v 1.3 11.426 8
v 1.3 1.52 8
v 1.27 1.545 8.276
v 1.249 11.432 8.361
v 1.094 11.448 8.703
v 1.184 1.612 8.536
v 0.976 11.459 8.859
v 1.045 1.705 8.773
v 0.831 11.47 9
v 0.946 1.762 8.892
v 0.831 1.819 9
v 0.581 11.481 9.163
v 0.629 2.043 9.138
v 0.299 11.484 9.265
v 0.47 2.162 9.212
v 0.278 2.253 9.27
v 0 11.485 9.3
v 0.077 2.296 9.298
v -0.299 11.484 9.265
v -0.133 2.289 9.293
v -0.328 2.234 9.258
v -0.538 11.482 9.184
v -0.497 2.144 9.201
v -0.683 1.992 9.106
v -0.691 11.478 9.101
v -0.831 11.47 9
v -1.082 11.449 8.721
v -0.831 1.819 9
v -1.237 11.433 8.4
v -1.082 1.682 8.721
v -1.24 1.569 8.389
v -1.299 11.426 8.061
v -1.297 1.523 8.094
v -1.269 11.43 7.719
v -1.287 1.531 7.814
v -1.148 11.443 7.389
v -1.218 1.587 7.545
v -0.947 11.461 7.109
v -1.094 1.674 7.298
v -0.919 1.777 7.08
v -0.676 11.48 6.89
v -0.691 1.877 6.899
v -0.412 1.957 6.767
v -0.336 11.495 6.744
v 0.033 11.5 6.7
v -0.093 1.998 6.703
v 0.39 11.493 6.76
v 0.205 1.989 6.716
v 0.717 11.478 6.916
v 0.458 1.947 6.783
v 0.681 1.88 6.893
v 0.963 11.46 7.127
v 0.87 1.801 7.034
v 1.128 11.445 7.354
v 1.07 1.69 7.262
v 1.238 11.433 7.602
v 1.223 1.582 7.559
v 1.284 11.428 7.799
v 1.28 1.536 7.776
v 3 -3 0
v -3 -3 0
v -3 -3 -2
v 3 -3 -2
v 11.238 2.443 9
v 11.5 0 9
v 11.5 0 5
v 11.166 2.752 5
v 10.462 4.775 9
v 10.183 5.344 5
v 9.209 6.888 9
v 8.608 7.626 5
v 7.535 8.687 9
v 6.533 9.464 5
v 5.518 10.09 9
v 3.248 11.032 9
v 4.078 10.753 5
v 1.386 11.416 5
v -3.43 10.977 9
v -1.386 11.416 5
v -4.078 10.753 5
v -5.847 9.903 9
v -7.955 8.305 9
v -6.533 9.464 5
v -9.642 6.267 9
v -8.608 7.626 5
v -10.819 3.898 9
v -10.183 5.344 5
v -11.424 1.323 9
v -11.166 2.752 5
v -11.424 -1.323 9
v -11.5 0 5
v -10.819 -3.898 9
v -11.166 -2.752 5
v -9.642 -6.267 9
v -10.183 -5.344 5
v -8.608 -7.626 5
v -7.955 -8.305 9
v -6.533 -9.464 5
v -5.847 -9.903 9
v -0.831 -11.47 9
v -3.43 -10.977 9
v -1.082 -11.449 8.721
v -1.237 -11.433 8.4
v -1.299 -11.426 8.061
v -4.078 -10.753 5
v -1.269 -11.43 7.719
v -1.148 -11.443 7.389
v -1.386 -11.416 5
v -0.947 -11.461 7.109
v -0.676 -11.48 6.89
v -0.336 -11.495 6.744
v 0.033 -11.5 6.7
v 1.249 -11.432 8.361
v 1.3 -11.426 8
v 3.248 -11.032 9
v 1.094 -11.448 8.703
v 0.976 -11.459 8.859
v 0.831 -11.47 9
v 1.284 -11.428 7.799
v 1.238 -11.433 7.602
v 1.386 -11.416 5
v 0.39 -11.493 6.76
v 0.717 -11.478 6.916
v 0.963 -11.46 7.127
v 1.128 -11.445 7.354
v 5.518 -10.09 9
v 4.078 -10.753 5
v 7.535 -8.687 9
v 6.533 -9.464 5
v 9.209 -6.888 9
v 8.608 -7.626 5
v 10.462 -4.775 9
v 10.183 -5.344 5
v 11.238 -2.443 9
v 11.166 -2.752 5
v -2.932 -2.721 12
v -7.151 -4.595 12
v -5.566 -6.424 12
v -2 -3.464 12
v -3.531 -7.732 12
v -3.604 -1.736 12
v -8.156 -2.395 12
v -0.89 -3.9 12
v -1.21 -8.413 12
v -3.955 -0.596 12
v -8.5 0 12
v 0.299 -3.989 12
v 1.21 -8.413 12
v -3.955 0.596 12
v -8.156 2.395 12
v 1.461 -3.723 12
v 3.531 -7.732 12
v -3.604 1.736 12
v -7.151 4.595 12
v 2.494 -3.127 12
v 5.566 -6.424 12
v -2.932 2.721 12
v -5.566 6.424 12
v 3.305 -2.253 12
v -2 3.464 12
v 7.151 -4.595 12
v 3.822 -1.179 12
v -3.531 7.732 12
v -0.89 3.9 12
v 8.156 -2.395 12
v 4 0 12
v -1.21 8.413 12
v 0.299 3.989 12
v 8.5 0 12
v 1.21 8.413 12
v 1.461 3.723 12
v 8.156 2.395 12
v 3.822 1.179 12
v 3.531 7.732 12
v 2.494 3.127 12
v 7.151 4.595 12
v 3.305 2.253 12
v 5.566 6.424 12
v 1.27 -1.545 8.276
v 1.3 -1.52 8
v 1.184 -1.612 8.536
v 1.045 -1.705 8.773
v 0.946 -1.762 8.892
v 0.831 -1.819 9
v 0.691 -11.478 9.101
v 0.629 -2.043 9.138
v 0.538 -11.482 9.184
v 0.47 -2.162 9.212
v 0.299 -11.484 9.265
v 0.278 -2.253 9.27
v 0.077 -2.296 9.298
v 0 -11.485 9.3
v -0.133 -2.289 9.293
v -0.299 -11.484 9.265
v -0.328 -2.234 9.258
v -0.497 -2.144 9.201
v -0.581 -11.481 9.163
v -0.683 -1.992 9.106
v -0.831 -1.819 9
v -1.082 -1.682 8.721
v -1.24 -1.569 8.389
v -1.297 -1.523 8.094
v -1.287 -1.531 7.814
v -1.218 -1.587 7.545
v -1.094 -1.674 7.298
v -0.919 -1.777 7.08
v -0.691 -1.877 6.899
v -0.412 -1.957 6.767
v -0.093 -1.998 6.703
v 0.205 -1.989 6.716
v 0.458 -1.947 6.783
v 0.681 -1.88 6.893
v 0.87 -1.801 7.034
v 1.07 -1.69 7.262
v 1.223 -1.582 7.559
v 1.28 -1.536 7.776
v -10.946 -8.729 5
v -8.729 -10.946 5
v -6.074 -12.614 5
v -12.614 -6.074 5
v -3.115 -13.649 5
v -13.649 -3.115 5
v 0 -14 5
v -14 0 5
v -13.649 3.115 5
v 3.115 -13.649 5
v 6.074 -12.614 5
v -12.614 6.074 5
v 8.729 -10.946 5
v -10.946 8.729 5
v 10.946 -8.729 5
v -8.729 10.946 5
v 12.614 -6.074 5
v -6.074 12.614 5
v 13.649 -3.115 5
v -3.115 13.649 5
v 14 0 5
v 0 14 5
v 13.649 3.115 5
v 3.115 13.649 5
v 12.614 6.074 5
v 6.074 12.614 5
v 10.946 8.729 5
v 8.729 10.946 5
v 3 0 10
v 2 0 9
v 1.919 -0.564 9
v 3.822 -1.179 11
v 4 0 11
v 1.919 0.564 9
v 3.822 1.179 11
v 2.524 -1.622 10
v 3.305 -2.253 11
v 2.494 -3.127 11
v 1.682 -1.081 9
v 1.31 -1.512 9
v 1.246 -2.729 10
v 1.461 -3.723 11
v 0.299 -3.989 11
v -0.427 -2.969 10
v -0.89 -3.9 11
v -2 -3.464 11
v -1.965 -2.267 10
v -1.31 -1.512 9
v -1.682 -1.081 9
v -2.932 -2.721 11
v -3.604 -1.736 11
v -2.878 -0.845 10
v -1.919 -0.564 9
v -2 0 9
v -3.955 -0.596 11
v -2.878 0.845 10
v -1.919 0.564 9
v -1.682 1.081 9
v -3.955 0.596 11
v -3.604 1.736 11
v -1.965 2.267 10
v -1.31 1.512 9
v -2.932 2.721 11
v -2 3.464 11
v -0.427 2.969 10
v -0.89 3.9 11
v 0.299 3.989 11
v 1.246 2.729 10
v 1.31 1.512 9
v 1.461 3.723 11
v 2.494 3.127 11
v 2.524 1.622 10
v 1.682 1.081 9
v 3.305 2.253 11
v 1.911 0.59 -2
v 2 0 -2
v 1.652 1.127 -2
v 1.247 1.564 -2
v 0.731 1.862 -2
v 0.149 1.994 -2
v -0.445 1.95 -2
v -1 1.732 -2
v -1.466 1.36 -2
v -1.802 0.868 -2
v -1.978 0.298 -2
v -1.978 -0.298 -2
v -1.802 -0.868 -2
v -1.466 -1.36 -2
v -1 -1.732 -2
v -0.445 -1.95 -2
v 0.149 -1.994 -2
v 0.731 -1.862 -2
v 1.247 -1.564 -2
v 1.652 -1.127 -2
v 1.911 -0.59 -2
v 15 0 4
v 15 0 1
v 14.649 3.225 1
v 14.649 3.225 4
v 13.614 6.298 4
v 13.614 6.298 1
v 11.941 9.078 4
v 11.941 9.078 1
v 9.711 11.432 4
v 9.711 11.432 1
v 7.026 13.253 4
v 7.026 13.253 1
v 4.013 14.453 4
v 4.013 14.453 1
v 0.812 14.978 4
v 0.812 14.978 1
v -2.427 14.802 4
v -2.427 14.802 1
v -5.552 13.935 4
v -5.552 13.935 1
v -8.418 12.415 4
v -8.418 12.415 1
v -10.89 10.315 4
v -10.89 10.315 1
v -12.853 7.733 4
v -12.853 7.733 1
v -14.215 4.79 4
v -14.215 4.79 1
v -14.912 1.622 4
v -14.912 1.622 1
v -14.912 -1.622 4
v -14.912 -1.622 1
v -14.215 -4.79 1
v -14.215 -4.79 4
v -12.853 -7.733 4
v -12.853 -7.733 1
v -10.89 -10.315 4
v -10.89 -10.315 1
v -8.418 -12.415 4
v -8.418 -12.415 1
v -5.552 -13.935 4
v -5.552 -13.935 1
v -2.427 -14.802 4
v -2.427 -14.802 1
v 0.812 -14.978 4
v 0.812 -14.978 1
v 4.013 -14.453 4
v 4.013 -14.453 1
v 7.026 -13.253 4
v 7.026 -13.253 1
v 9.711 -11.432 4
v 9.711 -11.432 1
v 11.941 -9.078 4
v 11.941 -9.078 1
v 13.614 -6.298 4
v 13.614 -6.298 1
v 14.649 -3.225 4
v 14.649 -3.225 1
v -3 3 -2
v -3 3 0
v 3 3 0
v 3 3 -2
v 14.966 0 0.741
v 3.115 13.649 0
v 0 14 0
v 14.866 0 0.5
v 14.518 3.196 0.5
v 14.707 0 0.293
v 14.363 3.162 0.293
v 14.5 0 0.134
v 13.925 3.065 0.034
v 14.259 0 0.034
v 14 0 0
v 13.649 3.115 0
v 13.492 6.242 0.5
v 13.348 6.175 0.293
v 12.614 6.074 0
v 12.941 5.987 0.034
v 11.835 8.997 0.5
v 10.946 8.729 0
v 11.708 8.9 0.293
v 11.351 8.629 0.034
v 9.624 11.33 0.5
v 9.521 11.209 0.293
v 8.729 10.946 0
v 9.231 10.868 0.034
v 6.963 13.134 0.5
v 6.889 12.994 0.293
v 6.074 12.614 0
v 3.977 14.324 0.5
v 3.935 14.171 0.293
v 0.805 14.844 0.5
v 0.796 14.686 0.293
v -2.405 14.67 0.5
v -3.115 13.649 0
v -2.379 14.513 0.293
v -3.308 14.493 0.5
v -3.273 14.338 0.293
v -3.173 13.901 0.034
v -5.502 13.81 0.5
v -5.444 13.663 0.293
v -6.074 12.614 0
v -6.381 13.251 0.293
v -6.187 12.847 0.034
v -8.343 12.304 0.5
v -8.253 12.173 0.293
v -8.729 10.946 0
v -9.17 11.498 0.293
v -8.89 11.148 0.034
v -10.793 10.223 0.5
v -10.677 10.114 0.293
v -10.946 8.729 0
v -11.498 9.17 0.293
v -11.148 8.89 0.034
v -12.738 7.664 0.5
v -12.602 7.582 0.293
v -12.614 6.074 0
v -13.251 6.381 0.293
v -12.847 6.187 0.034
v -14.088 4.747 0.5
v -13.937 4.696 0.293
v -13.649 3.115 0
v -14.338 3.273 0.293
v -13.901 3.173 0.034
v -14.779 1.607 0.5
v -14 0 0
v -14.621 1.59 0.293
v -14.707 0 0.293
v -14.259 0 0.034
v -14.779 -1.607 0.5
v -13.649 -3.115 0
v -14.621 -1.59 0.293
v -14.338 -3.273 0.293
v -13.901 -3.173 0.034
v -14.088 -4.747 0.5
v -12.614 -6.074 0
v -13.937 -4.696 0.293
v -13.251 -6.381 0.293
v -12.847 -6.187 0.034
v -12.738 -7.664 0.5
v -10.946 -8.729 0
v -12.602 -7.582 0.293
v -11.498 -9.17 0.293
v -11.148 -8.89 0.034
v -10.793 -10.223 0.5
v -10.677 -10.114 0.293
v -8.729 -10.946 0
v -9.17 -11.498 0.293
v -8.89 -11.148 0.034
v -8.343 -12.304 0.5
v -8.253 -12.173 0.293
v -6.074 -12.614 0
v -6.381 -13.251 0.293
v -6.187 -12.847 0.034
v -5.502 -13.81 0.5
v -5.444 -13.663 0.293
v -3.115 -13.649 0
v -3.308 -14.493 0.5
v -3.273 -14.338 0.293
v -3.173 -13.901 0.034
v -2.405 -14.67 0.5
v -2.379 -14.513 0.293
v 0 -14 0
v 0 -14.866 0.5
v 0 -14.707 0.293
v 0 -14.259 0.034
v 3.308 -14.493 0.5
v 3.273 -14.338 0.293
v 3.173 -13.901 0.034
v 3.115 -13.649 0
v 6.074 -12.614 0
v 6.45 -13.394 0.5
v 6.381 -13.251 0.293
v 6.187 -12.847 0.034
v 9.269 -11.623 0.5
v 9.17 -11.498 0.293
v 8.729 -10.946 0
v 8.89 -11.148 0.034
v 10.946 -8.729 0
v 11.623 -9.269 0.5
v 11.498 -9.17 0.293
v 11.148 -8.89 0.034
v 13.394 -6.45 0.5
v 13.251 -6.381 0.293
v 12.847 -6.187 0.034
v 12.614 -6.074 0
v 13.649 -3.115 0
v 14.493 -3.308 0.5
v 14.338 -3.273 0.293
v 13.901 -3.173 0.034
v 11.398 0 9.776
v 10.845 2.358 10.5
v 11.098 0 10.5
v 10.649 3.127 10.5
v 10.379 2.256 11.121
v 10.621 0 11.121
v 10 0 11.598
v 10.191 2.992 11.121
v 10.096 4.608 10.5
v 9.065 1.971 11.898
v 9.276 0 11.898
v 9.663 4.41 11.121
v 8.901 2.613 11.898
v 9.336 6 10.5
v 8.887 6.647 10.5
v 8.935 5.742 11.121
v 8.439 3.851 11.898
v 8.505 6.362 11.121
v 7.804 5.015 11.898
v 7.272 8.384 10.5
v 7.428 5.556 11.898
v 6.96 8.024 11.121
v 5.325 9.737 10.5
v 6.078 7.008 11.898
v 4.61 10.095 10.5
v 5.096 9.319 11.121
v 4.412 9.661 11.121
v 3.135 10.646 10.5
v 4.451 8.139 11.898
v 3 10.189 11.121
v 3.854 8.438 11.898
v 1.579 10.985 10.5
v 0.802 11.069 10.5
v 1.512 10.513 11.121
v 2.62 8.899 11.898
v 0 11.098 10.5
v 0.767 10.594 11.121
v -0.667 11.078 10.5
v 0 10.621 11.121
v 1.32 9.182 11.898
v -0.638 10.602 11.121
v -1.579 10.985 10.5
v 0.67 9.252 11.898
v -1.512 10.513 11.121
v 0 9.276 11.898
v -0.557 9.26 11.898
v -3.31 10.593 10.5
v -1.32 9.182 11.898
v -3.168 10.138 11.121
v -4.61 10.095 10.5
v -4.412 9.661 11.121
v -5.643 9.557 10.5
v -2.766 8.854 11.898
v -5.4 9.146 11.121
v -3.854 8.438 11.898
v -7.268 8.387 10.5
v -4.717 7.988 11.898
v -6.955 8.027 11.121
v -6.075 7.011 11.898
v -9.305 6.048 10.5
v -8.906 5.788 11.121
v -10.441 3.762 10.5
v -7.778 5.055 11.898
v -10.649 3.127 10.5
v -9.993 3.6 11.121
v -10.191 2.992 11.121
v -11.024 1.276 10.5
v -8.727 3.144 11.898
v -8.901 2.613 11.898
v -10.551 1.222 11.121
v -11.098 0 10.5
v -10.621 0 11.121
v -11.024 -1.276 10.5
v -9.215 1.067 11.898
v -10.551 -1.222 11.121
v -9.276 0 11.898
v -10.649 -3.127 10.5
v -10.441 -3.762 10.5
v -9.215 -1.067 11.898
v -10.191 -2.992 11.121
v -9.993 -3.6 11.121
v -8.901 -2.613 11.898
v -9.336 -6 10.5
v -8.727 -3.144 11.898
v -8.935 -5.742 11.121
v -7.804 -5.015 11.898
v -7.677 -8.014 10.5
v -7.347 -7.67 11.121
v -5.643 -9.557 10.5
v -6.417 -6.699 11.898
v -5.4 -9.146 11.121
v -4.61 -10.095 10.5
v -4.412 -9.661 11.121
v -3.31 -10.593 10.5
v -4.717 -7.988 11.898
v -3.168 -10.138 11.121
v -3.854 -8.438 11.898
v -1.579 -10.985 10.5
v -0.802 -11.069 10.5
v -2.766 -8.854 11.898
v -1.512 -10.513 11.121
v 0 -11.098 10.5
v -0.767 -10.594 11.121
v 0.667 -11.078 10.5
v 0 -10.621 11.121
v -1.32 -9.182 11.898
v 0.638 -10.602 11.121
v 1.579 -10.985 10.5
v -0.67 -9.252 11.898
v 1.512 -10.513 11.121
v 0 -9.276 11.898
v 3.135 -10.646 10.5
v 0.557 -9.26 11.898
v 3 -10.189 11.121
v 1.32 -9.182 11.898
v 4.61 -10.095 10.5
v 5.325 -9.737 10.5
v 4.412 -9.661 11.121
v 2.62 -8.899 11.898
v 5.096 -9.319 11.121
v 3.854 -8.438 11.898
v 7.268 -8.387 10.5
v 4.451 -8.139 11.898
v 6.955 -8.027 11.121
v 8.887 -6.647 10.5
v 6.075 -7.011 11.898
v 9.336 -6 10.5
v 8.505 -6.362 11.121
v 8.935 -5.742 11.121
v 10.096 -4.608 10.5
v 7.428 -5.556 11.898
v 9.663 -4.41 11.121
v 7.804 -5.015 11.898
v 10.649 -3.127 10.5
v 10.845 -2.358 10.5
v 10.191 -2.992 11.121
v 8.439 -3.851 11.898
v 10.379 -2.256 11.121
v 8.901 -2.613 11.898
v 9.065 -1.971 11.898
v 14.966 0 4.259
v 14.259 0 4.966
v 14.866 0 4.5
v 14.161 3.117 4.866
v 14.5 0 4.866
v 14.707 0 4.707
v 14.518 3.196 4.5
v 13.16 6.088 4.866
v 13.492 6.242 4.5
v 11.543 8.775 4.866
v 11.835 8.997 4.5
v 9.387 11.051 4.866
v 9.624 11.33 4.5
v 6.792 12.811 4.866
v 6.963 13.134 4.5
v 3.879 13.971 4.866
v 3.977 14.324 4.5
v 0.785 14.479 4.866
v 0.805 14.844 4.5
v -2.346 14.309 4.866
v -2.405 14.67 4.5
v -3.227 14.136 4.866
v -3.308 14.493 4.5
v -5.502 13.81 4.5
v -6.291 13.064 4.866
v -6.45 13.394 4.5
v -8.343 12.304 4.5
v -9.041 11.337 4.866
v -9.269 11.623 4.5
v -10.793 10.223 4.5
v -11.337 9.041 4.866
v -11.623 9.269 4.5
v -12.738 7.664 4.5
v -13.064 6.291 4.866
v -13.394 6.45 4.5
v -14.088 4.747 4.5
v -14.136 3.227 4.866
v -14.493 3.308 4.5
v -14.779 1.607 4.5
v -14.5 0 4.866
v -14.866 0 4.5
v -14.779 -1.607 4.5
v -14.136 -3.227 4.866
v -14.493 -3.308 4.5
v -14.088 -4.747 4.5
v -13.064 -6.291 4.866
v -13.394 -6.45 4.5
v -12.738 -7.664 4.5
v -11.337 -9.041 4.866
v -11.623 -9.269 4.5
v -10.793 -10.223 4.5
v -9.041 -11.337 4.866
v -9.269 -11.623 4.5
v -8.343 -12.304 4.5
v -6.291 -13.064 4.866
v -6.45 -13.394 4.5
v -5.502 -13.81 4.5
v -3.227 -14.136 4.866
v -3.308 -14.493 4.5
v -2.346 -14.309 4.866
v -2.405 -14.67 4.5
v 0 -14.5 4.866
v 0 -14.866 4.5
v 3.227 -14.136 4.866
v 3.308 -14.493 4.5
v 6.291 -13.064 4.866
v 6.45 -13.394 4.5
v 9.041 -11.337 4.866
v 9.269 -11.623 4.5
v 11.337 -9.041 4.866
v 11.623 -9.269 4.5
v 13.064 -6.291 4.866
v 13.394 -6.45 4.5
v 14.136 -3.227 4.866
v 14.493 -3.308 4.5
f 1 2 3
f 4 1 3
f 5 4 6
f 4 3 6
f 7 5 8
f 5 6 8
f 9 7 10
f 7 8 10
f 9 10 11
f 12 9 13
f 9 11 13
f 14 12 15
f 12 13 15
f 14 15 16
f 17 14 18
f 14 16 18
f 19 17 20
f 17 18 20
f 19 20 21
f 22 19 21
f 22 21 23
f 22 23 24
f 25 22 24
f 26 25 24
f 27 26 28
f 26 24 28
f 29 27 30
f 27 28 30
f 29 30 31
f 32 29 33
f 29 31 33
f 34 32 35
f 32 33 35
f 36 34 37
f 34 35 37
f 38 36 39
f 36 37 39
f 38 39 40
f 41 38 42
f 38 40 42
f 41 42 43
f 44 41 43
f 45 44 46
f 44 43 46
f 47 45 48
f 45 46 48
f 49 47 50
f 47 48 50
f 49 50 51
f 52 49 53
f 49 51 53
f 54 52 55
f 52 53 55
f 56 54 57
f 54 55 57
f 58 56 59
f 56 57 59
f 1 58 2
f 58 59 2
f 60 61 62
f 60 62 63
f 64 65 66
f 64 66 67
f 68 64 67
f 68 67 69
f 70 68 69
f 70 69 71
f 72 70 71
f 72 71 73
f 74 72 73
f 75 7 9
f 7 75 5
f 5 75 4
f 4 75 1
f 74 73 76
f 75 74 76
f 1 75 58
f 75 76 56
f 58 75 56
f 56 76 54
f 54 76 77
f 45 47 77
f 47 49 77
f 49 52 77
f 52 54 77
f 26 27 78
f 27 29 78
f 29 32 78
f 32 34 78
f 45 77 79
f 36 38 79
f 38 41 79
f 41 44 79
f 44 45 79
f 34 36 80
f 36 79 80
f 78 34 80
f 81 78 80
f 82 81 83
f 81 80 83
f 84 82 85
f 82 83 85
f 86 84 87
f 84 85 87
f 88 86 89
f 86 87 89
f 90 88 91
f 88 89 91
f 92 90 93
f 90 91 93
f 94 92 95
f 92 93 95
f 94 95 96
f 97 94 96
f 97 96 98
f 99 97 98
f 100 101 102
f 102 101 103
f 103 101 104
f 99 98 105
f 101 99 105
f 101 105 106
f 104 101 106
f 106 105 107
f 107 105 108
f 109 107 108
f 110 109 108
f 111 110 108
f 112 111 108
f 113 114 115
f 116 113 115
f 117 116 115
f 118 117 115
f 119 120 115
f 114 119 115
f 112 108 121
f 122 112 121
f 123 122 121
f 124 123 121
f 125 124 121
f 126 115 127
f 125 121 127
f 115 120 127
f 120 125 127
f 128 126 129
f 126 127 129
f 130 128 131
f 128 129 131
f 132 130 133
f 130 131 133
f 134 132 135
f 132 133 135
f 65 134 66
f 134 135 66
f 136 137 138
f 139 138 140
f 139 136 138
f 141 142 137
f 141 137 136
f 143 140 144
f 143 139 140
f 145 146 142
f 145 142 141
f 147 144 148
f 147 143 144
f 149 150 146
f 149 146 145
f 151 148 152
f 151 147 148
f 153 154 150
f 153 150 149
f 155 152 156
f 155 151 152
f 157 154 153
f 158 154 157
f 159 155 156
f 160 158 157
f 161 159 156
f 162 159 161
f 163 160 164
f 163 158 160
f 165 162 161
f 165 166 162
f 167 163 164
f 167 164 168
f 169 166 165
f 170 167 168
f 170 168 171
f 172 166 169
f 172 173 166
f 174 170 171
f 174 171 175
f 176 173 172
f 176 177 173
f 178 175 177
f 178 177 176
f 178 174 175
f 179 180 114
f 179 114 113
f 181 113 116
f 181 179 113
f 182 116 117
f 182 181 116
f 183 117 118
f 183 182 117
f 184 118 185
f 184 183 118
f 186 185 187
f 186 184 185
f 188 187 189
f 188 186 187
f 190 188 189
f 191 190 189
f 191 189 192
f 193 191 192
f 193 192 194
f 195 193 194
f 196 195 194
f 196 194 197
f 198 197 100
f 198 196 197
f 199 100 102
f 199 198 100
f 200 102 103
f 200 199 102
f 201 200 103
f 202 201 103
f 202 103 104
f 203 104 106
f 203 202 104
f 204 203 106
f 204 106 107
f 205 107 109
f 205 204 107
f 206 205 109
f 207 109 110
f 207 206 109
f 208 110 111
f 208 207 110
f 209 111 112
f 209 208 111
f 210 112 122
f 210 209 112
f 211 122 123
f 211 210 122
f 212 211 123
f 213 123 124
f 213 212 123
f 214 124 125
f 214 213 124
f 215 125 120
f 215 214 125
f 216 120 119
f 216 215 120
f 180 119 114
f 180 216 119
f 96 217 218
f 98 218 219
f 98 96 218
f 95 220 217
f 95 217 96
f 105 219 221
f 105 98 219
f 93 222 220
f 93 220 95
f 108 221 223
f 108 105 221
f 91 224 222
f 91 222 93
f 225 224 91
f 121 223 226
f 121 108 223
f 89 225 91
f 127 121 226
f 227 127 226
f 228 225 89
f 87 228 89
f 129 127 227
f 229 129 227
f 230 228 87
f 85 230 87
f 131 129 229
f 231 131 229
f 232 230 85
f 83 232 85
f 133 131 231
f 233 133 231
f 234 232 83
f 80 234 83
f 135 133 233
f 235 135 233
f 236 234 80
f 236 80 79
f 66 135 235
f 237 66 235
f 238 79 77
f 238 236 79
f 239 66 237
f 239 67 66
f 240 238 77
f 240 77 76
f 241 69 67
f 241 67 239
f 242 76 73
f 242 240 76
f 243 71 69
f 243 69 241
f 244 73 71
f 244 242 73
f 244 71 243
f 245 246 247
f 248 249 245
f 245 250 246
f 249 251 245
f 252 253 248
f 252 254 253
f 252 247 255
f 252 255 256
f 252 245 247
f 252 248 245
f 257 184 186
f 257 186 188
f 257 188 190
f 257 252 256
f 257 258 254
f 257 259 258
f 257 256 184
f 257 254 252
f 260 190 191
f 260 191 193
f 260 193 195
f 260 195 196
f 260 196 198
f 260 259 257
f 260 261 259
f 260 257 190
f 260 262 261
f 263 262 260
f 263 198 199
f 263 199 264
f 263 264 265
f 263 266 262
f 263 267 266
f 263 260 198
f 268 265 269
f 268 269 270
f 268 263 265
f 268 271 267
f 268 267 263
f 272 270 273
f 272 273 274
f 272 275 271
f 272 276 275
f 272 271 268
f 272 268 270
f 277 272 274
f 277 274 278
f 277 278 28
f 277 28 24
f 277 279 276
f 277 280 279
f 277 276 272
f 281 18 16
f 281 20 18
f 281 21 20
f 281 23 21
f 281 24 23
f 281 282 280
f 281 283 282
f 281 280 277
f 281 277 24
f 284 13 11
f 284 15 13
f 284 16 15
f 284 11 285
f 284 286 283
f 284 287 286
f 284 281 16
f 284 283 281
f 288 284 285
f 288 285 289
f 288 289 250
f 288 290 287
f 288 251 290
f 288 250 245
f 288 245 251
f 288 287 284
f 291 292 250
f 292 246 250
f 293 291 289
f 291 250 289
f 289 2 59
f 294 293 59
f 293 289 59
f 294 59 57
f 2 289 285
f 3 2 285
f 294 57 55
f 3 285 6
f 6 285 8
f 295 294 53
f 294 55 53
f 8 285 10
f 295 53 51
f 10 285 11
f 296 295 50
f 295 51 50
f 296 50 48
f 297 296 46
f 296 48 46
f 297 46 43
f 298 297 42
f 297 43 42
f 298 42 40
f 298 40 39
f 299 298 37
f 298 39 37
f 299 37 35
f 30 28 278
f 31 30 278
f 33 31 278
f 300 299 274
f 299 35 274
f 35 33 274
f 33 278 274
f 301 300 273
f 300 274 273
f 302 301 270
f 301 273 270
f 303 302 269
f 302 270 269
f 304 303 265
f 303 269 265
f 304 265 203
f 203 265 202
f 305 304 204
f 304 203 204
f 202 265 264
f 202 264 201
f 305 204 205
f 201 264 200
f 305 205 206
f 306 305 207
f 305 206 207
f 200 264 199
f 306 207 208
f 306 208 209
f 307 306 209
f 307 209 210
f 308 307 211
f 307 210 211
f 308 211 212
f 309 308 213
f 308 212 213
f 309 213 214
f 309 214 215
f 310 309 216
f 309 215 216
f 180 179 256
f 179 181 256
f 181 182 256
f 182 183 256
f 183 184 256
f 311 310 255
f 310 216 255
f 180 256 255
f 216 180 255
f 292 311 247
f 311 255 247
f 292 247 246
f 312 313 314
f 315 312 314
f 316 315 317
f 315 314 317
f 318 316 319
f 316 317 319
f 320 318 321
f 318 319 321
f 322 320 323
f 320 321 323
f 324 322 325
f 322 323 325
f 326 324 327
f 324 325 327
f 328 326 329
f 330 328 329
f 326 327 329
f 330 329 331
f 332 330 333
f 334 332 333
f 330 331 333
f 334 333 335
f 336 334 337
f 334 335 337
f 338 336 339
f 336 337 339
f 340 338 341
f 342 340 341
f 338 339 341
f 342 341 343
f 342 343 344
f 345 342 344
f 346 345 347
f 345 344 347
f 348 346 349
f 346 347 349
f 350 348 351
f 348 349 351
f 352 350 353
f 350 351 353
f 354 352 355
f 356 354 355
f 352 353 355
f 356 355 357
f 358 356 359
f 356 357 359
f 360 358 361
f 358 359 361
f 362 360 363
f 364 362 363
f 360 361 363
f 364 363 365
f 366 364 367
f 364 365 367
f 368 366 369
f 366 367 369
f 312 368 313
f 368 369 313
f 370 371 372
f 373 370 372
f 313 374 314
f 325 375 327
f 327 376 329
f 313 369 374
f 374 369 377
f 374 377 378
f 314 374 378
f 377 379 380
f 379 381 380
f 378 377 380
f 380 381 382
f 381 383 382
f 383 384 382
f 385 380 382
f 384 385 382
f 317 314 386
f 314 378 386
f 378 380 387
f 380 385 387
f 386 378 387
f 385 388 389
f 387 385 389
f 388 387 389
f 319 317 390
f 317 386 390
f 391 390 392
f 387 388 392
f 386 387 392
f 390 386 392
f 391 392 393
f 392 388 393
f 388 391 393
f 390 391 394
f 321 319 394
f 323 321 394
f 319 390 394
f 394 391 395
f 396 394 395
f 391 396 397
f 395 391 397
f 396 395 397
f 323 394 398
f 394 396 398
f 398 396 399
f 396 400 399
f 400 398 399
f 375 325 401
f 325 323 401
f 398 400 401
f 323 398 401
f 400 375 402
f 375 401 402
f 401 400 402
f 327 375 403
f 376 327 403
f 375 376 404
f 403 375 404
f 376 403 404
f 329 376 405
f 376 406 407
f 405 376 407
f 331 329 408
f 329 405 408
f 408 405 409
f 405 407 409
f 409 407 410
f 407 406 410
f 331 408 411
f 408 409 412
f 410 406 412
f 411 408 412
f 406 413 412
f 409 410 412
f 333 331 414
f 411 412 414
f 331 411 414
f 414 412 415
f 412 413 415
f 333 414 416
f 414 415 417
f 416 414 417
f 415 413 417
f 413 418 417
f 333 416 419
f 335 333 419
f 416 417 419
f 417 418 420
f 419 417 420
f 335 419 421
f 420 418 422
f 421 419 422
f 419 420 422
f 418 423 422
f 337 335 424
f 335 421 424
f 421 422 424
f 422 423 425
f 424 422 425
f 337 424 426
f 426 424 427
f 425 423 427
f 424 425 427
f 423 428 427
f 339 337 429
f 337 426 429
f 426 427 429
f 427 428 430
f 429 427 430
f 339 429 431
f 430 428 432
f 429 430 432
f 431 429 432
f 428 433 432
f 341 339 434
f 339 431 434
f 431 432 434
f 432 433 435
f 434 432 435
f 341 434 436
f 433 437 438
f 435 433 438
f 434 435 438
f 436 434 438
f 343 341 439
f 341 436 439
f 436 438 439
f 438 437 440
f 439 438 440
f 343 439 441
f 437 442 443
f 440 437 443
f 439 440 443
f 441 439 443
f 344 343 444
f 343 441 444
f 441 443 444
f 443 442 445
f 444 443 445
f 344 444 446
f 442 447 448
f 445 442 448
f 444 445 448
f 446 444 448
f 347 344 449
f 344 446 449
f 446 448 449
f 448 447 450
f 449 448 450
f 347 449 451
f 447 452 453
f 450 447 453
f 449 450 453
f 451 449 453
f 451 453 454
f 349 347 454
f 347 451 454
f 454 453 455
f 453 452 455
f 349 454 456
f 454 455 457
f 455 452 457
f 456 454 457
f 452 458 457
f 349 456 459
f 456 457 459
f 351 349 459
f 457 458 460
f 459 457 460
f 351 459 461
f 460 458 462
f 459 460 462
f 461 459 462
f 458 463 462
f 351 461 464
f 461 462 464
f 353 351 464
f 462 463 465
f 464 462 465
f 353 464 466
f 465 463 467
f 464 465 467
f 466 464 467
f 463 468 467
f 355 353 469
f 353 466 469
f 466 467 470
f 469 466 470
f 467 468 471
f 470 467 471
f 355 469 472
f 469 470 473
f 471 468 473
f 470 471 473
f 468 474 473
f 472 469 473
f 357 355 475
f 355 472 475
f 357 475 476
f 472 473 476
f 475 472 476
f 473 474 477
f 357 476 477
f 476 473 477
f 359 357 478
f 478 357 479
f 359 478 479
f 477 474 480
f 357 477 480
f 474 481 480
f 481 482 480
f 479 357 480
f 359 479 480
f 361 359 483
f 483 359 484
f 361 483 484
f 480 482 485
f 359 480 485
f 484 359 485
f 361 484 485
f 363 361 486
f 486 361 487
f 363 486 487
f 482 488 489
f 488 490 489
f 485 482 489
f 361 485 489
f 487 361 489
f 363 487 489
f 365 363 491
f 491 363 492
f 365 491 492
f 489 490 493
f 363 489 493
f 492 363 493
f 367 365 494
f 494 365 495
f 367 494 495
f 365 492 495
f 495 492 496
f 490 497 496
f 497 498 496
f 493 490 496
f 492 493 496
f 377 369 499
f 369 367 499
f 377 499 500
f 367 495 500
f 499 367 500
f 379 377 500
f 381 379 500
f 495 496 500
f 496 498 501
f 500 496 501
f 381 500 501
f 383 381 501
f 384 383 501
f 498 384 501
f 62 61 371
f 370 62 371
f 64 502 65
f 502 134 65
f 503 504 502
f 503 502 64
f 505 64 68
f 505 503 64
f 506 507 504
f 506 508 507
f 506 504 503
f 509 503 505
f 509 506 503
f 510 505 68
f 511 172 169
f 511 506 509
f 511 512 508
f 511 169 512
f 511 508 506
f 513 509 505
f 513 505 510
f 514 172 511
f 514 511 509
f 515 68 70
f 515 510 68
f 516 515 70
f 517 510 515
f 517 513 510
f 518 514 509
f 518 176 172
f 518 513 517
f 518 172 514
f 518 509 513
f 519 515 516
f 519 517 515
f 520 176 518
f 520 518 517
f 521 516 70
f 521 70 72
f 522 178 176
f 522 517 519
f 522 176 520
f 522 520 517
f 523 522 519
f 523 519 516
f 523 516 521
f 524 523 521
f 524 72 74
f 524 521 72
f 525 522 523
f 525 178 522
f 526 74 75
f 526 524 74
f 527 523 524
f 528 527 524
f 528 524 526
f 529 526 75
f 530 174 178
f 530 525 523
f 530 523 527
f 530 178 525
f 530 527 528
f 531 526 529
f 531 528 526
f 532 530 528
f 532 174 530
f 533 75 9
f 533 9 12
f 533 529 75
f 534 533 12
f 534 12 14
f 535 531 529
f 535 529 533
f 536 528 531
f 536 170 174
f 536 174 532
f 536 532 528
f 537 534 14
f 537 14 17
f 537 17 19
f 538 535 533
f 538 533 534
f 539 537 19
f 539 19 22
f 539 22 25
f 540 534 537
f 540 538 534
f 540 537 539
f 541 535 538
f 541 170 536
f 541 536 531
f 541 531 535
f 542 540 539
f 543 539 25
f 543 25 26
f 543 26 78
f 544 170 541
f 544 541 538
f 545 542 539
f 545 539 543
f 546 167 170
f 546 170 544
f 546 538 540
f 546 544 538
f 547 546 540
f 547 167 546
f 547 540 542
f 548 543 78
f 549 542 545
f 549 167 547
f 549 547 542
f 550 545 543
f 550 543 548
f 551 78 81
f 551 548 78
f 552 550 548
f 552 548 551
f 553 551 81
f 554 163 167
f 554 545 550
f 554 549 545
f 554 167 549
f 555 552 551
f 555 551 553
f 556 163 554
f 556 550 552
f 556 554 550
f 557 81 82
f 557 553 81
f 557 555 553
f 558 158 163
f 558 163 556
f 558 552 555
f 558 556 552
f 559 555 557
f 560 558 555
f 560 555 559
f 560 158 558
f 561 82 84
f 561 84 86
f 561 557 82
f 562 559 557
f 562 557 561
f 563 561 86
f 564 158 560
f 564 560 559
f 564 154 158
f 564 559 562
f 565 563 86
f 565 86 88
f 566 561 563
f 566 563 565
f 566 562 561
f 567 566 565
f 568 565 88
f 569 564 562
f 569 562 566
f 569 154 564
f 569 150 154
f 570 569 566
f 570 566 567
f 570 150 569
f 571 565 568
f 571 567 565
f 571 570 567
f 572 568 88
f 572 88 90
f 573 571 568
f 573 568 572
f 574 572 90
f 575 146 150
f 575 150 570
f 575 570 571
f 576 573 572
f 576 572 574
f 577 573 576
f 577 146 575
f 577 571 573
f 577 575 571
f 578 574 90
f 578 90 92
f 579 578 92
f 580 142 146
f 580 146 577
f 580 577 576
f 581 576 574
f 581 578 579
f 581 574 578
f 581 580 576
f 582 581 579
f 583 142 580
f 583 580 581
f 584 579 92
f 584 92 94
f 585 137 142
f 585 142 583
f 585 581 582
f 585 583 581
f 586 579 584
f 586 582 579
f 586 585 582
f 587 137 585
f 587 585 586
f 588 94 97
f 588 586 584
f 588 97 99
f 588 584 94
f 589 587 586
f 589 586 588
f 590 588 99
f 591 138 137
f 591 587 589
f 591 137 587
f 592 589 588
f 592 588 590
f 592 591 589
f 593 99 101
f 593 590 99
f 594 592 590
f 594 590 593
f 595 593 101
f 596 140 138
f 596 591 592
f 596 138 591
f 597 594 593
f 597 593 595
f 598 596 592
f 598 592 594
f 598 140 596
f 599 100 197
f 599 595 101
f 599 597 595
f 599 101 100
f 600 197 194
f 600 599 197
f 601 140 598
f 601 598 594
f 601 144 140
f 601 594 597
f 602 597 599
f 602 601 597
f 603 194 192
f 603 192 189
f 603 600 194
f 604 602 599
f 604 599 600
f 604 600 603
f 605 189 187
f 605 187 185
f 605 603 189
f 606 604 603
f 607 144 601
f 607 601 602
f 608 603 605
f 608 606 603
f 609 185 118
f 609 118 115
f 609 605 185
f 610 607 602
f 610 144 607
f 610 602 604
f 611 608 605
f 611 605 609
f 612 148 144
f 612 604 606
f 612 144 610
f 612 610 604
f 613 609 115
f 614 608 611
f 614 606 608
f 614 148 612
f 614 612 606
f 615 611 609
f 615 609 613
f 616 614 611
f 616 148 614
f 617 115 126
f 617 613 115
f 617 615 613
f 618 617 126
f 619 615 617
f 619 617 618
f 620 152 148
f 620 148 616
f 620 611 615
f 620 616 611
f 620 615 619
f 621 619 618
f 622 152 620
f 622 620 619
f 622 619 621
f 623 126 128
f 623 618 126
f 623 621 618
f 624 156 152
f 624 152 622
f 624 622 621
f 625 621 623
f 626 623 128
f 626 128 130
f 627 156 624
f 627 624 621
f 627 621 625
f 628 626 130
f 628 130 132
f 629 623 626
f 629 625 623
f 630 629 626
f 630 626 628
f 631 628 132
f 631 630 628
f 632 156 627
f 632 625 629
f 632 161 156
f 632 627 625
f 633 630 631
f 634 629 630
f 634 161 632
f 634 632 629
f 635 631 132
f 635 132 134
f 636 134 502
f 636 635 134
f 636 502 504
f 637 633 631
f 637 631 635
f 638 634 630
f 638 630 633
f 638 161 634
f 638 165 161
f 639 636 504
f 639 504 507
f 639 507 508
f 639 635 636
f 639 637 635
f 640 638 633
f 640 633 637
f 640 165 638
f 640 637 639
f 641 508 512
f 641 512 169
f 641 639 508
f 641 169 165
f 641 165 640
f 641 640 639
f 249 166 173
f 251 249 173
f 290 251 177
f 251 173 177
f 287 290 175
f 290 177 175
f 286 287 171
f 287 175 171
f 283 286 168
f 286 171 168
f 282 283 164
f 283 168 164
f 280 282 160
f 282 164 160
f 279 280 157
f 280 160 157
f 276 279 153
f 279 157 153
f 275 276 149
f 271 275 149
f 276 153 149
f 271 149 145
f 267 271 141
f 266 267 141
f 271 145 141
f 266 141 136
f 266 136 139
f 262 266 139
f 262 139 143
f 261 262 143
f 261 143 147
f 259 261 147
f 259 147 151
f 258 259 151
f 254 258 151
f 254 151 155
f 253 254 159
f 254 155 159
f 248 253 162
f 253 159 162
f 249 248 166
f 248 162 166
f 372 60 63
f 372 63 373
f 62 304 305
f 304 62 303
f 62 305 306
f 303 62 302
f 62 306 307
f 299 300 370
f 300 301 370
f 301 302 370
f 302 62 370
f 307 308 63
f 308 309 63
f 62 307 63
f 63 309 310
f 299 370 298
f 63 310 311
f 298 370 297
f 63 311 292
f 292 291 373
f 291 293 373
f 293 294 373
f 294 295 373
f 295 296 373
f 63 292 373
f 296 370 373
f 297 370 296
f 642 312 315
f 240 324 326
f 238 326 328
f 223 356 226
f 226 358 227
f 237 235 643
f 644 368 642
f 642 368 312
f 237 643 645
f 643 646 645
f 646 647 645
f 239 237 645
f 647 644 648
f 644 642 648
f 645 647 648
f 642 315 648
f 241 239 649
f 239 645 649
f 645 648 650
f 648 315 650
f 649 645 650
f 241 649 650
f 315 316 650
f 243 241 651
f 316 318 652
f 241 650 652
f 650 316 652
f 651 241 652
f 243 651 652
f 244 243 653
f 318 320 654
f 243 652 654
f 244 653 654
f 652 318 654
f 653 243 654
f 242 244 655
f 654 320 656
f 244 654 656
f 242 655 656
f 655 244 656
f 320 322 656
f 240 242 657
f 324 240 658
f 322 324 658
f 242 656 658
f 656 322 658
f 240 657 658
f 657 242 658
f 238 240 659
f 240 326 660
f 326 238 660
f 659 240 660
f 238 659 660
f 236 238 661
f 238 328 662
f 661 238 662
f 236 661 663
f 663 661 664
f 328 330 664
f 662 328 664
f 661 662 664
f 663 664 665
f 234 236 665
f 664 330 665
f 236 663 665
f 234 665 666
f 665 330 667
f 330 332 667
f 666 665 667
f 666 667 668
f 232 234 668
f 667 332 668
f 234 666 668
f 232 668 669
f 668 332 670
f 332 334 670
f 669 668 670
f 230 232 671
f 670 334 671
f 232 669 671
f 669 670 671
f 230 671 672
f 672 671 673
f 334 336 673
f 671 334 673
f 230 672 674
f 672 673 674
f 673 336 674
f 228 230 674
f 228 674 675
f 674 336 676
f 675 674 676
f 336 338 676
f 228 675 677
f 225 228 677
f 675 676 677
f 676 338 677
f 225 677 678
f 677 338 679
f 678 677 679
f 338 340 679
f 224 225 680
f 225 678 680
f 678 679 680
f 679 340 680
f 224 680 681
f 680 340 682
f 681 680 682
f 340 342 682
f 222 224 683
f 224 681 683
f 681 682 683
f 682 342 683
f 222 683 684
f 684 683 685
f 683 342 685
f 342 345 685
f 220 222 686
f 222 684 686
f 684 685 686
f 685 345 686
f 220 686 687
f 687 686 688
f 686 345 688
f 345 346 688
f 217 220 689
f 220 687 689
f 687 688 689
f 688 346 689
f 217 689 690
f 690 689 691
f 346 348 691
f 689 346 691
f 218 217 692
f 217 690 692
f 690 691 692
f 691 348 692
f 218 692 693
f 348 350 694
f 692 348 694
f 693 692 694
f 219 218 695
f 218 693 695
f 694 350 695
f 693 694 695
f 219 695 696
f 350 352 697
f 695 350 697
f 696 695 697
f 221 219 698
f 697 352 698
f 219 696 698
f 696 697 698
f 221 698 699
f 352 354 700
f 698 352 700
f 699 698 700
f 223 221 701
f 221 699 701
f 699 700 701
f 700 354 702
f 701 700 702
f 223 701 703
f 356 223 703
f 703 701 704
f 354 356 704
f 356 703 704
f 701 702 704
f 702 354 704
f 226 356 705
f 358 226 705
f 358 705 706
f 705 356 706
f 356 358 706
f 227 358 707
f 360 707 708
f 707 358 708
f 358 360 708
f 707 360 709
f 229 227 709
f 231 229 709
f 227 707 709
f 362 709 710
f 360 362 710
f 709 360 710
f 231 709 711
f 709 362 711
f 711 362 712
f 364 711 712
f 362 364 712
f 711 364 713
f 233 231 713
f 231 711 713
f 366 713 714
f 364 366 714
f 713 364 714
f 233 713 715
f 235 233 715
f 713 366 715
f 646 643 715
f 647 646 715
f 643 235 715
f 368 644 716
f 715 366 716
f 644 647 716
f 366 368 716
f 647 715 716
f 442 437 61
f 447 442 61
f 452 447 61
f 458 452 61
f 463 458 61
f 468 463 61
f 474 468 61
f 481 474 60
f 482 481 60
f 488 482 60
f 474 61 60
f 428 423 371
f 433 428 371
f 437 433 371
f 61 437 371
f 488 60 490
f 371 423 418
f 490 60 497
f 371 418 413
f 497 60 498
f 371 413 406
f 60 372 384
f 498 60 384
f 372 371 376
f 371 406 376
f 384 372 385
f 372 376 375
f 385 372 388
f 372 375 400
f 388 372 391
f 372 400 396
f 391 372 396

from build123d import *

# Parameters (mm, degrees)
F0_R           = 15
F0_R_2         = 11.5
F1_DEPTH       = 5
F0_R_3         = 2
F2_DEPTH       = 12
F3_R           = 3
F4_R           = 1
F5_R           = 4
F6_DEPTH       = 1
F7_SIZE        = 1.99999
F8_R           = 1.3
F9_DEPTH       = 25
F9_DEPTH_BACK  = 25
F10_W          = 6
F10_H          = 6
F11_DEPTH      = 5
F11_DEPTH_BACK = 2
F12_R          = 2
F13_DEPTH      = 25
F13_DEPTH_BACK = 25


# Not quite as in the source:
# - a fillet or chamfer is up to 0.001 mm smaller than in the source, because OpenCascade refuses the exact size


with BuildPart() as f1:
    # F0 (on Top) → F1 (new body)
    with BuildSketch(Plane.XY):
        Circle(F0_R)
        Circle(F0_R_2, mode=Mode.SUBTRACT)
    extrude(amount=F1_DEPTH)

    # F0 (on Top) → F2 (join)
    with BuildSketch(Plane.XY):
        Circle(F0_R_2)
        Circle(F0_R_3, mode=Mode.SUBTRACT)
    extrude(amount=F2_DEPTH)

    # F3
    f3_edges = [f1.edges().sort_by_distance(p)[0] for p in [
        (-11.5, 0, 12),
    ]]
    fillet(f3_edges, radius=F3_R)

    # F4
    f4_edges = [f1.edges().sort_by_distance(p)[0] for p in [
        (-15, 0, 0),
        (-15, 0, 5),
    ]]
    fillet(f4_edges, radius=F4_R)

    # F5 (on face) → F6 (cut)
    with BuildSketch(Plane.XY.offset(12)):
        Circle(F5_R)
    extrude(amount=-F6_DEPTH, mode=Mode.SUBTRACT)

    # F7 (size 2 in the source; OpenCascade refuses exactly that, so slightly less here)
    f7_edges = [f1.edges().sort_by_distance(p)[0] for p in [
        (-2, 0, 11),
    ]]
    chamfer(f7_edges, length=F7_SIZE)

    # F8 (on Front) → F9 (cut, two sides)
    with BuildSketch(Plane.XZ) as f9_sk:
        with Locations((0, 8)):
            Circle(F8_R)
    extrude(amount=F9_DEPTH, mode=Mode.SUBTRACT)
    extrude(f9_sk.sketch, amount=-F9_DEPTH_BACK, mode=Mode.SUBTRACT)

    # F10 (on Top) → F11 (join, two sides)
    with BuildSketch(Plane.XY) as f11_sk:
        Rectangle(F10_W, F10_H)
    extrude(amount=F11_DEPTH)
    extrude(f11_sk.sketch, amount=-F11_DEPTH_BACK)

    # F12 (on Top) → F13 (cut, two sides)
    with BuildSketch(Plane.XY) as f13_sk:
        Circle(F12_R)
    extrude(amount=-F13_DEPTH, mode=Mode.SUBTRACT)
    extrude(f13_sk.sketch, amount=F13_DEPTH_BACK, mode=Mode.SUBTRACT)


solid = f1.part
